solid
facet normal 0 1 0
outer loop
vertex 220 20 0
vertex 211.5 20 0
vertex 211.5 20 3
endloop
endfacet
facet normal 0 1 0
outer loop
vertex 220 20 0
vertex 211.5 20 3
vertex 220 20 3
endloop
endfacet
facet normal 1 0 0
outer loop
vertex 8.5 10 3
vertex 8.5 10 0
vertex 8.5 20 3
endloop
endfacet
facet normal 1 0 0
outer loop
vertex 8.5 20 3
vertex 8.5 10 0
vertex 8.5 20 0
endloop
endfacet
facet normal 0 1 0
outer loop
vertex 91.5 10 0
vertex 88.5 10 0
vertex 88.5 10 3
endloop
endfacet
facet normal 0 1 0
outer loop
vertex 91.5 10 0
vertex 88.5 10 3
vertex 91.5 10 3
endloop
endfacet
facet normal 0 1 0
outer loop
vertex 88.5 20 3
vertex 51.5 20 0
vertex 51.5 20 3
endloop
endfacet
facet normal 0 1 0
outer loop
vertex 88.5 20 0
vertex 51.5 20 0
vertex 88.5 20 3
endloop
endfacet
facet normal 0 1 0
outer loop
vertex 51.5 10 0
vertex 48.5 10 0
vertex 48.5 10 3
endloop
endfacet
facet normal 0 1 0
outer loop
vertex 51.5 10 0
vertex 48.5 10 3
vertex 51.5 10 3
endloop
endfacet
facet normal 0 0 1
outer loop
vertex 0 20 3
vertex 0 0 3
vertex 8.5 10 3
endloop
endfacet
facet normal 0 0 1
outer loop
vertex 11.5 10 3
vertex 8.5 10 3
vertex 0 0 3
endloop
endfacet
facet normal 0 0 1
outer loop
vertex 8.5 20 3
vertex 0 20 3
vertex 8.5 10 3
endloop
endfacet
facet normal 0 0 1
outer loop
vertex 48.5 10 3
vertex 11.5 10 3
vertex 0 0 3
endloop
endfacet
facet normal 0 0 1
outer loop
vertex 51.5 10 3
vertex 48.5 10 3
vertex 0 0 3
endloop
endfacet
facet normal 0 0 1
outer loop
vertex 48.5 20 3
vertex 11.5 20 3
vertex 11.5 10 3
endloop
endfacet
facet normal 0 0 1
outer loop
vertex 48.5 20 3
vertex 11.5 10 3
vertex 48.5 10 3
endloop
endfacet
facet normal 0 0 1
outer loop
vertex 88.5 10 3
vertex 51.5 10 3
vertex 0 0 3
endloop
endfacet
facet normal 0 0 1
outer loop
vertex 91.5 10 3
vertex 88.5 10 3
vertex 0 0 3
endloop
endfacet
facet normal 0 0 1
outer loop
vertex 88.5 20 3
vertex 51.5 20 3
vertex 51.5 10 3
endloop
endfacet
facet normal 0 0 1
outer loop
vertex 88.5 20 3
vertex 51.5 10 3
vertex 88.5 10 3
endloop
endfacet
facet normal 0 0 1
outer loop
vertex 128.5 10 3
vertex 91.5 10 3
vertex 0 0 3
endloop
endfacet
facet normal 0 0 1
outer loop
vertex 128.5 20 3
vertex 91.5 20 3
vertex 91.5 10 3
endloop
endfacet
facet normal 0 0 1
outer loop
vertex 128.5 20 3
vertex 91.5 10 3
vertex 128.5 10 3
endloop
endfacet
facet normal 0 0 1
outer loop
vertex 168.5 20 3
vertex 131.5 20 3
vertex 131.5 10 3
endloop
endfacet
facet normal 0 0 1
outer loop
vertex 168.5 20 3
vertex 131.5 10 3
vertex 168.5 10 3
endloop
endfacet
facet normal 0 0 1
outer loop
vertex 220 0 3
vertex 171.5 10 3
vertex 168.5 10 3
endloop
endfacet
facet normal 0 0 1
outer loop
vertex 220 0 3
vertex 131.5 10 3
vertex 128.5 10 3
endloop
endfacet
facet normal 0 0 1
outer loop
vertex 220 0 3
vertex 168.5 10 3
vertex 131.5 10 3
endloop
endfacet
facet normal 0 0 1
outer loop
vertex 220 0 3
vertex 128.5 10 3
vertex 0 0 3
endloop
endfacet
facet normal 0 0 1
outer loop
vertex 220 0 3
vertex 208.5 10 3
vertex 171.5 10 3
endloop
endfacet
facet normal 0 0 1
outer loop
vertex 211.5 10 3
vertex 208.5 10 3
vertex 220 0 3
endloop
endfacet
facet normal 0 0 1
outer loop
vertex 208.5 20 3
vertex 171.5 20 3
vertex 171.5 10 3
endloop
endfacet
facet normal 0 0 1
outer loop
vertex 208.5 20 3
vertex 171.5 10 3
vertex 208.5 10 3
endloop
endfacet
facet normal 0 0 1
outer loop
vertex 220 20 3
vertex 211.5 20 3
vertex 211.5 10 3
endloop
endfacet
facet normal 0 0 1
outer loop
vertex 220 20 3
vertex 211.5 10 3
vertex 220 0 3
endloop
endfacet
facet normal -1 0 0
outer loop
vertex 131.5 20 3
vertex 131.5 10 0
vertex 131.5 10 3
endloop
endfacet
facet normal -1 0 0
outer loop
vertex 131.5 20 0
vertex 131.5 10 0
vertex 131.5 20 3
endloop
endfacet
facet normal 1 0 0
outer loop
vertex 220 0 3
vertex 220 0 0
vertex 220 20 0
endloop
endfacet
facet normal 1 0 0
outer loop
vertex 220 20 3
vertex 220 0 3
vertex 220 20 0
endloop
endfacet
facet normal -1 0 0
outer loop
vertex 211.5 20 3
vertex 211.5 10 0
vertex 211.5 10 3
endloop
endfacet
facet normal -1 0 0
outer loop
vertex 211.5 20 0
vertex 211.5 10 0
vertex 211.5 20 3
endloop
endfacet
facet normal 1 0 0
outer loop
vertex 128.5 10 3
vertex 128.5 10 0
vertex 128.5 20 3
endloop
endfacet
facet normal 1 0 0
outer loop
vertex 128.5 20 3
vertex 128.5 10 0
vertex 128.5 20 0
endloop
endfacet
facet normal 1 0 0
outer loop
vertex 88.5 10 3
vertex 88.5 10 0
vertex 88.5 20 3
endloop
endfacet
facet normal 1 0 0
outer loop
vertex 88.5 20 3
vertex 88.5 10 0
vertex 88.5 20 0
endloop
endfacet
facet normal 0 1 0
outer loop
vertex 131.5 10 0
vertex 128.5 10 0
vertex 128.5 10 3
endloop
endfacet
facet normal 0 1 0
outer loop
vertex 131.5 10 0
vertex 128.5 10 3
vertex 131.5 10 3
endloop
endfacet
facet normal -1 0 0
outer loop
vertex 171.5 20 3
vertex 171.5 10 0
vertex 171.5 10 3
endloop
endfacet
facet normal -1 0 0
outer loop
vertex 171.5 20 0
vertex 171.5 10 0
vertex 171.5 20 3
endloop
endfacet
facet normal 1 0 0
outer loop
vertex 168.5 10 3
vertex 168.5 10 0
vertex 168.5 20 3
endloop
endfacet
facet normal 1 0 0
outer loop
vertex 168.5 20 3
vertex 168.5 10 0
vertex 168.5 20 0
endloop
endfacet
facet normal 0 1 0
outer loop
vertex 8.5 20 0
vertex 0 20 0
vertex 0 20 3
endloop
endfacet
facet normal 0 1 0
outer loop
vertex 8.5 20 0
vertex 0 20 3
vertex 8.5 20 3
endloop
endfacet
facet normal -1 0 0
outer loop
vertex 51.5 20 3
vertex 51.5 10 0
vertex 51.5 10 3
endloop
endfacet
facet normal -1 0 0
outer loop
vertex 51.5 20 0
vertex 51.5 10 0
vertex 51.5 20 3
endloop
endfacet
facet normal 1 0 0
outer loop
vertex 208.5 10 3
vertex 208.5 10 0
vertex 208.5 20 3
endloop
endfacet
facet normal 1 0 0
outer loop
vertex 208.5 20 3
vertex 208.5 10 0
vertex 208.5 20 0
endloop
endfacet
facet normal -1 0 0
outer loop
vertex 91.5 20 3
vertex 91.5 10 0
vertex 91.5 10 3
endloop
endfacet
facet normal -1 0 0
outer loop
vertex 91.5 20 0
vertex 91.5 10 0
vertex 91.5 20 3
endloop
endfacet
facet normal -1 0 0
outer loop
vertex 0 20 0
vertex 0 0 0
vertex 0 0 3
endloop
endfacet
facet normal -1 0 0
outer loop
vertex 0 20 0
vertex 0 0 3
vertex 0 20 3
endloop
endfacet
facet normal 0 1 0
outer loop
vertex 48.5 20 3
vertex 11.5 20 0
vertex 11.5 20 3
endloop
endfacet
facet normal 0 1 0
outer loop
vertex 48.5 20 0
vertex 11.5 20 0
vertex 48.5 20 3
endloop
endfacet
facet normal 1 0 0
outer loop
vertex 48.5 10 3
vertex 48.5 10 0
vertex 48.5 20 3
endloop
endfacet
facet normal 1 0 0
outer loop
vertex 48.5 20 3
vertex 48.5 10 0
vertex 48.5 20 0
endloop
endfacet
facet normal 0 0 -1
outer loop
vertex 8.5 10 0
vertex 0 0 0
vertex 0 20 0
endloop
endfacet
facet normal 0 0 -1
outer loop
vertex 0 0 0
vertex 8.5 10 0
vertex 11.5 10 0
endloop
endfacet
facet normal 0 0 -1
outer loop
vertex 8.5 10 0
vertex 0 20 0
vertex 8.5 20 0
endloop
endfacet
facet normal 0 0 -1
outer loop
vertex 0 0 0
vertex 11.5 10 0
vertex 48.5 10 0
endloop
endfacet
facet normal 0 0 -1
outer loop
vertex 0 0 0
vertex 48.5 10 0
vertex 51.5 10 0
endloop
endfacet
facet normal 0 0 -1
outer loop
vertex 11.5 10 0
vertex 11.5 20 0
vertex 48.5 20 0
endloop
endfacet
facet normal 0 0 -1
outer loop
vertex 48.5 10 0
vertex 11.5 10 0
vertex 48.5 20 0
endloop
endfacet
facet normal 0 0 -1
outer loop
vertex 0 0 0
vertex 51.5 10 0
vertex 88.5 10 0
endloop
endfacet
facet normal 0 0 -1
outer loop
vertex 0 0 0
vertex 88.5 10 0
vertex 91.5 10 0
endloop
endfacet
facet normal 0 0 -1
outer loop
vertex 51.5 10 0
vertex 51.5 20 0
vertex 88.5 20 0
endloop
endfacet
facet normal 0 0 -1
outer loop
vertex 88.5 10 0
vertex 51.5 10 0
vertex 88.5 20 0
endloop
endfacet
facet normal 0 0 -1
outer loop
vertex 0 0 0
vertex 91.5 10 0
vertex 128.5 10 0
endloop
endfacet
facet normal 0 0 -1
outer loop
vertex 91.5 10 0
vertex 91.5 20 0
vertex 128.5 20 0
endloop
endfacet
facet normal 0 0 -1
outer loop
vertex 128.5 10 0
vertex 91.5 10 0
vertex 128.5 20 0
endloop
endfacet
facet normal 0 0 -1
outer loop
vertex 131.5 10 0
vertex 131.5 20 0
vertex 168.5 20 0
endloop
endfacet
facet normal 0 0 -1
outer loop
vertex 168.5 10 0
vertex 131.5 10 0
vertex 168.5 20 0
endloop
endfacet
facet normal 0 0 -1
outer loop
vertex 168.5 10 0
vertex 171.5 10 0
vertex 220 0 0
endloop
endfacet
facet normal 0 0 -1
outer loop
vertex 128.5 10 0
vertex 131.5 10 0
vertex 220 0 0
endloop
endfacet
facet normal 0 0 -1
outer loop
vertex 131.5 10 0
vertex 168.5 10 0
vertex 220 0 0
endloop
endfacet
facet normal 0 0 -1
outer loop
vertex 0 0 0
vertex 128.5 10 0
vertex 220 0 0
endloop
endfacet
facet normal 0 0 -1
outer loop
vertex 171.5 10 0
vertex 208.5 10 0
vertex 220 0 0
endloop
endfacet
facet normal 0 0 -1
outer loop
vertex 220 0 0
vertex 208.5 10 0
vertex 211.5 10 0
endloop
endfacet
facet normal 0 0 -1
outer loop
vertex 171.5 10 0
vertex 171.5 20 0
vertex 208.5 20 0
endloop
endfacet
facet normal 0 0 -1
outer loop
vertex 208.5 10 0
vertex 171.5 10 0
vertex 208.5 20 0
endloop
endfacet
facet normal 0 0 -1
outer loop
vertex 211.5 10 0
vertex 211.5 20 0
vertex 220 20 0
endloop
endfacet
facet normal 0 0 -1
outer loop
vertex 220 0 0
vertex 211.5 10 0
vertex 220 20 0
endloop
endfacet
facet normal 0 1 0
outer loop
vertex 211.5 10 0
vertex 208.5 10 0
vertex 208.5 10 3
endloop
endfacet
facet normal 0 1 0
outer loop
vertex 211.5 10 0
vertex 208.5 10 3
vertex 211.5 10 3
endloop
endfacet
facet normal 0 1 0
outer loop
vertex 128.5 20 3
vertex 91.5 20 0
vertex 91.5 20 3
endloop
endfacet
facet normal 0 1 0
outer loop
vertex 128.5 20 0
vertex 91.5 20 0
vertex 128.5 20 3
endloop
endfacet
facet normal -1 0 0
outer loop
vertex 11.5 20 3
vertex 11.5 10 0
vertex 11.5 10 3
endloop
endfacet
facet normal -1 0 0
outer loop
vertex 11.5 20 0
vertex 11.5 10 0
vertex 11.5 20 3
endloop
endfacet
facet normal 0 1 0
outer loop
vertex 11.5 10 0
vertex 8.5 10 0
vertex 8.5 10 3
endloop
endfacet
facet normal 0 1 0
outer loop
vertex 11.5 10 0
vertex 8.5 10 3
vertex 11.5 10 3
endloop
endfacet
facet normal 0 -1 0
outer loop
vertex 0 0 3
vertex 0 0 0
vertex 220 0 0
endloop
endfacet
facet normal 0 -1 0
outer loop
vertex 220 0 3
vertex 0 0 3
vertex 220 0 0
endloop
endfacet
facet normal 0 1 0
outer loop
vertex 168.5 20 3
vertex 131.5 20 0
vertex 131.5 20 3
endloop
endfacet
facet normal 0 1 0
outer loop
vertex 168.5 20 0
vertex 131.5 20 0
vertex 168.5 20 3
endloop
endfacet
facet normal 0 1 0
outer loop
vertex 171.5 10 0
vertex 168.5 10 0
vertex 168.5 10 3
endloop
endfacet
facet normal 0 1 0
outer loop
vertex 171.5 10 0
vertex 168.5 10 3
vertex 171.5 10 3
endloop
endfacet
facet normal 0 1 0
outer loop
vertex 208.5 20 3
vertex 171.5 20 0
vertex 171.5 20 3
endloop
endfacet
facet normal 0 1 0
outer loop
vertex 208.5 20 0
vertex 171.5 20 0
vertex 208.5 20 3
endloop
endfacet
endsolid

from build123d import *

# Parameters (mm, degrees)
SKETCH2_W           = 220
SKETCH2_H           = 20
BOSS_EXTRUDE1_DEPTH = 3
SKETCH4_W           = 3
SKETCH4_H           = 10
CUT_EXTRUDE2_DEPTH  = 221.927589947
LPATTERN1_COUNT     = 6
LPATTERN1_PITCH     = 40


with BuildPart() as part:
    # Sketch2 → Boss-Extrude1 (new body)
    with BuildSketch(Plane.XY):
        with Locations((110, 10)):
            Rectangle(SKETCH2_W, SKETCH2_H)
    extrude(amount=BOSS_EXTRUDE1_DEPTH)

    # Sketch4 → Cut-Extrude2 (cut, through all)
    with BuildSketch(Plane.XY):
        with Locations((10, 15)):
            Rectangle(SKETCH4_W, SKETCH4_H)
    cut_extrude2 = extrude(amount=CUT_EXTRUDE2_DEPTH, mode=Mode.SUBTRACT)

    # LPattern1: Cut-Extrude2 ×6
    with Locations(*[(i * LPATTERN1_PITCH, 0, 0) for i in range(1, LPATTERN1_COUNT)]):
        add(cut_extrude2, mode=Mode.SUBTRACT)


solid = part.part
